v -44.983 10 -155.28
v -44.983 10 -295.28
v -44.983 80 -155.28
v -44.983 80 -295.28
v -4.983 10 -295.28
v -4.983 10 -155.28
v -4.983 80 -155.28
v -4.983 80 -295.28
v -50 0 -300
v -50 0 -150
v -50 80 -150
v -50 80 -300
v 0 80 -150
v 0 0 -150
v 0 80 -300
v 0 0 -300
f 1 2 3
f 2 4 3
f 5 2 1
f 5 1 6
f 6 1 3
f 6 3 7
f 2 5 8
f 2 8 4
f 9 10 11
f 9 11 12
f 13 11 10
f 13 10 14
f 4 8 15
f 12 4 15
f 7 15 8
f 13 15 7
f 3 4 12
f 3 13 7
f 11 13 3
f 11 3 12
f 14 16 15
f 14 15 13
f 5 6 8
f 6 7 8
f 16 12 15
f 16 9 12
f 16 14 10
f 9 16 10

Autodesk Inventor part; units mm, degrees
ref_plane "YZ Plane" through (0, 0, 0) normal (1, 0, 0) x (0, 1, 0)
ref_plane "XZ Plane" through (0, 0, 0) normal (0, 1, 0) x (-1, 0, 0)
ref_plane "XY Plane" through (0, 0, 0) normal (0, 0, 1) x (1, 0, 0)
sketch "Sketch1" plane through (0, 0, 0) normal (0, 1, 0) x (-1, 0, 0)
  line L0 (0, 0) -> (50, 0)
  line L1 (50, 0) -> (50, -300)
  line L2 (50, -300) -> (0, -300)
  line L3 (0, -300) -> (0, 0)
  dimension "d0" = 50
  dimension "d1" = 300
extrude "Extrusion1" add sketch "Sketch1" along normal blind 80
sketch "Sketch2" plane through (0, 80, 0) normal (0, 1, 0) x (1, 0, 0)
  line L0 (0, 0) -> (-50, 0)
  line L1 (-50, 0) -> (-50, 150)
  line L2 (-50, 150) -> (0, 150)
  line L3 (0, 150) -> (0, 0)
  dimension "d4" = 50
  dimension "d5" = 150
extrude "Extrusion2" cut sketch "Sketch2" against normal blind 100
sketch "Sketch3" plane through (0, 80, 0) normal (0, 1, 0) x (1, 0, 0)
  line L0 (-44.983, 155.2795) -> (-4.983, 155.2795)
  line L1 (-4.983, 155.2795) -> (-4.983, 295.2795)
  line L2 (-4.983, 295.2795) -> (-44.983, 295.2795)
  line L3 (-44.983, 295.2795) -> (-44.983, 155.2795)
  point P0 (0, 0)
  dimension "d8" = 40
  dimension "d9" = 140
extrude "Extrusion3" cut sketch "Sketch3" against normal blind 70
properties part number "storebox2"
